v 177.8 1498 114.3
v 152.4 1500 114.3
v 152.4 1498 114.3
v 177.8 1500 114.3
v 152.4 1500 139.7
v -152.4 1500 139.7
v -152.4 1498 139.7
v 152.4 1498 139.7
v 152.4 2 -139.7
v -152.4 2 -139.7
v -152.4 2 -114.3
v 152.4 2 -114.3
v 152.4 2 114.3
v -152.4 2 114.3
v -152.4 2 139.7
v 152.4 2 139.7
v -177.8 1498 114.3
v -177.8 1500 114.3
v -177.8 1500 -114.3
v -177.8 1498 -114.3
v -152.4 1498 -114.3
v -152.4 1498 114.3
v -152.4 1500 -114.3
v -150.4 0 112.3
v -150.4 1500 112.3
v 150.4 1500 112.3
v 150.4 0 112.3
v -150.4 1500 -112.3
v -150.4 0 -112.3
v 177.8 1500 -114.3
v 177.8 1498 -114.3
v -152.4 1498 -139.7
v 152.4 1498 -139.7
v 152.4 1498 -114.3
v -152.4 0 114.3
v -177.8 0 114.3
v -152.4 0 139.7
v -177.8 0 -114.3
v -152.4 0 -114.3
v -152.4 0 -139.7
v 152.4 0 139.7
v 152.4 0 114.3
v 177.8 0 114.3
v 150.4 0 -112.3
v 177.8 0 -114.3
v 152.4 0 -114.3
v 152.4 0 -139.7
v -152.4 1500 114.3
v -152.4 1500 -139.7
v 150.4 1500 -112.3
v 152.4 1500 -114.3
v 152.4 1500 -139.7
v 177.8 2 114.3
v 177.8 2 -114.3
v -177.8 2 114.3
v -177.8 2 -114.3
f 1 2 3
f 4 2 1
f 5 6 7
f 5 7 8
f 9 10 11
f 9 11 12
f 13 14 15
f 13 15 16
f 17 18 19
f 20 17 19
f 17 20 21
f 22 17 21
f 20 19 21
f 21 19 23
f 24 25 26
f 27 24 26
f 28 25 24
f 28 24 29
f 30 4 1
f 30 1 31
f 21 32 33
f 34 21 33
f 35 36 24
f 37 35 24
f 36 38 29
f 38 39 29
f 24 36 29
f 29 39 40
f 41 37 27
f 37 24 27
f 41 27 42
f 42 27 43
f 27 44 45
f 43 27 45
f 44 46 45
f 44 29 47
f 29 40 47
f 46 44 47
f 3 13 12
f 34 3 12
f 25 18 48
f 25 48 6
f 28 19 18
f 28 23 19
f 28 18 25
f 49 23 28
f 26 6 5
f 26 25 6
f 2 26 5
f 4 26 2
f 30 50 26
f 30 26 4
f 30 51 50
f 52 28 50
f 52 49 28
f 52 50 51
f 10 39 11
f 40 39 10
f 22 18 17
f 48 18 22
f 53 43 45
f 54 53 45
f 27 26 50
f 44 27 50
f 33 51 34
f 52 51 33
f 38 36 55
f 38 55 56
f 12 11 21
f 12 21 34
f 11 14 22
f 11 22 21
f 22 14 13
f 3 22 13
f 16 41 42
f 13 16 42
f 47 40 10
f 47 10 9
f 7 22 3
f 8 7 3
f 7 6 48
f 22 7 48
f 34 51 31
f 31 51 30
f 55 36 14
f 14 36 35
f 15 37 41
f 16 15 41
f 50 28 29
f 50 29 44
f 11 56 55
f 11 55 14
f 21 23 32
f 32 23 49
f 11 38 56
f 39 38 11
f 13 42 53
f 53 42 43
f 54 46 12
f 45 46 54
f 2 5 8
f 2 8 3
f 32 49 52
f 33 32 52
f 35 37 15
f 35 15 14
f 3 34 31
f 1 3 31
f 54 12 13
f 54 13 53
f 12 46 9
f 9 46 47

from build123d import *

# Parameters (mm, degrees)
CROQUIS1_W              = 304.8
CROQUIS1_H              = 228.6
SALIENTE_EXTRUIR1_DEPTH = 1500
VACIADO1_T              = -2
CROQUIS2_W              = 25.4
CROQUIS2_H              = 228.6
CROQUIS2_W_2            = 304.8
CROQUIS2_H_2            = 25.4
SALIENTE_EXTRUIR2_DEPTH = 2


with BuildPart() as part:
    # Croquis1 → Saliente-Extruir1 (new body)
    with BuildSketch(Plane(origin=(0, 0, 0), x_dir=(1, 0, 0), z_dir=(0, 1, 0))):
        Rectangle(CROQUIS1_W, CROQUIS1_H)
    extrude(amount=SALIENTE_EXTRUIR1_DEPTH)

    # Vaciado1
    vaciado1_openings = [part.faces().sort_by_distance(p)[0] for p in [
        (0, 1500, 0),
        (0, 0, 0),
    ]]
    offset(amount=VACIADO1_T, openings=vaciado1_openings, kind=Kind.INTERSECTION)

    # Croquis2 → Saliente-Extruir2 (add)
    with BuildSketch(Plane(origin=(0, 1500, 0), x_dir=(1, 0, 0), z_dir=(0, 1, 0))):
        with Locations((-165.1, 0)):
            Rectangle(CROQUIS2_W, CROQUIS2_H)
        with Locations((0, 127)):
            Rectangle(CROQUIS2_W_2, CROQUIS2_H_2)
        with Locations((0, -127)):
            Rectangle(CROQUIS2_W_2, CROQUIS2_H_2)
        with Locations((165.1, 0)):
            Rectangle(CROQUIS2_W, CROQUIS2_H)
    saliente_extruir2 = extrude(amount=-SALIENTE_EXTRUIR2_DEPTH)

    # Simetría1: Saliente-Extruir2 across plane
    add(saliente_extruir2.mirror(Plane.ZX.offset(750)))


solid = part.part
